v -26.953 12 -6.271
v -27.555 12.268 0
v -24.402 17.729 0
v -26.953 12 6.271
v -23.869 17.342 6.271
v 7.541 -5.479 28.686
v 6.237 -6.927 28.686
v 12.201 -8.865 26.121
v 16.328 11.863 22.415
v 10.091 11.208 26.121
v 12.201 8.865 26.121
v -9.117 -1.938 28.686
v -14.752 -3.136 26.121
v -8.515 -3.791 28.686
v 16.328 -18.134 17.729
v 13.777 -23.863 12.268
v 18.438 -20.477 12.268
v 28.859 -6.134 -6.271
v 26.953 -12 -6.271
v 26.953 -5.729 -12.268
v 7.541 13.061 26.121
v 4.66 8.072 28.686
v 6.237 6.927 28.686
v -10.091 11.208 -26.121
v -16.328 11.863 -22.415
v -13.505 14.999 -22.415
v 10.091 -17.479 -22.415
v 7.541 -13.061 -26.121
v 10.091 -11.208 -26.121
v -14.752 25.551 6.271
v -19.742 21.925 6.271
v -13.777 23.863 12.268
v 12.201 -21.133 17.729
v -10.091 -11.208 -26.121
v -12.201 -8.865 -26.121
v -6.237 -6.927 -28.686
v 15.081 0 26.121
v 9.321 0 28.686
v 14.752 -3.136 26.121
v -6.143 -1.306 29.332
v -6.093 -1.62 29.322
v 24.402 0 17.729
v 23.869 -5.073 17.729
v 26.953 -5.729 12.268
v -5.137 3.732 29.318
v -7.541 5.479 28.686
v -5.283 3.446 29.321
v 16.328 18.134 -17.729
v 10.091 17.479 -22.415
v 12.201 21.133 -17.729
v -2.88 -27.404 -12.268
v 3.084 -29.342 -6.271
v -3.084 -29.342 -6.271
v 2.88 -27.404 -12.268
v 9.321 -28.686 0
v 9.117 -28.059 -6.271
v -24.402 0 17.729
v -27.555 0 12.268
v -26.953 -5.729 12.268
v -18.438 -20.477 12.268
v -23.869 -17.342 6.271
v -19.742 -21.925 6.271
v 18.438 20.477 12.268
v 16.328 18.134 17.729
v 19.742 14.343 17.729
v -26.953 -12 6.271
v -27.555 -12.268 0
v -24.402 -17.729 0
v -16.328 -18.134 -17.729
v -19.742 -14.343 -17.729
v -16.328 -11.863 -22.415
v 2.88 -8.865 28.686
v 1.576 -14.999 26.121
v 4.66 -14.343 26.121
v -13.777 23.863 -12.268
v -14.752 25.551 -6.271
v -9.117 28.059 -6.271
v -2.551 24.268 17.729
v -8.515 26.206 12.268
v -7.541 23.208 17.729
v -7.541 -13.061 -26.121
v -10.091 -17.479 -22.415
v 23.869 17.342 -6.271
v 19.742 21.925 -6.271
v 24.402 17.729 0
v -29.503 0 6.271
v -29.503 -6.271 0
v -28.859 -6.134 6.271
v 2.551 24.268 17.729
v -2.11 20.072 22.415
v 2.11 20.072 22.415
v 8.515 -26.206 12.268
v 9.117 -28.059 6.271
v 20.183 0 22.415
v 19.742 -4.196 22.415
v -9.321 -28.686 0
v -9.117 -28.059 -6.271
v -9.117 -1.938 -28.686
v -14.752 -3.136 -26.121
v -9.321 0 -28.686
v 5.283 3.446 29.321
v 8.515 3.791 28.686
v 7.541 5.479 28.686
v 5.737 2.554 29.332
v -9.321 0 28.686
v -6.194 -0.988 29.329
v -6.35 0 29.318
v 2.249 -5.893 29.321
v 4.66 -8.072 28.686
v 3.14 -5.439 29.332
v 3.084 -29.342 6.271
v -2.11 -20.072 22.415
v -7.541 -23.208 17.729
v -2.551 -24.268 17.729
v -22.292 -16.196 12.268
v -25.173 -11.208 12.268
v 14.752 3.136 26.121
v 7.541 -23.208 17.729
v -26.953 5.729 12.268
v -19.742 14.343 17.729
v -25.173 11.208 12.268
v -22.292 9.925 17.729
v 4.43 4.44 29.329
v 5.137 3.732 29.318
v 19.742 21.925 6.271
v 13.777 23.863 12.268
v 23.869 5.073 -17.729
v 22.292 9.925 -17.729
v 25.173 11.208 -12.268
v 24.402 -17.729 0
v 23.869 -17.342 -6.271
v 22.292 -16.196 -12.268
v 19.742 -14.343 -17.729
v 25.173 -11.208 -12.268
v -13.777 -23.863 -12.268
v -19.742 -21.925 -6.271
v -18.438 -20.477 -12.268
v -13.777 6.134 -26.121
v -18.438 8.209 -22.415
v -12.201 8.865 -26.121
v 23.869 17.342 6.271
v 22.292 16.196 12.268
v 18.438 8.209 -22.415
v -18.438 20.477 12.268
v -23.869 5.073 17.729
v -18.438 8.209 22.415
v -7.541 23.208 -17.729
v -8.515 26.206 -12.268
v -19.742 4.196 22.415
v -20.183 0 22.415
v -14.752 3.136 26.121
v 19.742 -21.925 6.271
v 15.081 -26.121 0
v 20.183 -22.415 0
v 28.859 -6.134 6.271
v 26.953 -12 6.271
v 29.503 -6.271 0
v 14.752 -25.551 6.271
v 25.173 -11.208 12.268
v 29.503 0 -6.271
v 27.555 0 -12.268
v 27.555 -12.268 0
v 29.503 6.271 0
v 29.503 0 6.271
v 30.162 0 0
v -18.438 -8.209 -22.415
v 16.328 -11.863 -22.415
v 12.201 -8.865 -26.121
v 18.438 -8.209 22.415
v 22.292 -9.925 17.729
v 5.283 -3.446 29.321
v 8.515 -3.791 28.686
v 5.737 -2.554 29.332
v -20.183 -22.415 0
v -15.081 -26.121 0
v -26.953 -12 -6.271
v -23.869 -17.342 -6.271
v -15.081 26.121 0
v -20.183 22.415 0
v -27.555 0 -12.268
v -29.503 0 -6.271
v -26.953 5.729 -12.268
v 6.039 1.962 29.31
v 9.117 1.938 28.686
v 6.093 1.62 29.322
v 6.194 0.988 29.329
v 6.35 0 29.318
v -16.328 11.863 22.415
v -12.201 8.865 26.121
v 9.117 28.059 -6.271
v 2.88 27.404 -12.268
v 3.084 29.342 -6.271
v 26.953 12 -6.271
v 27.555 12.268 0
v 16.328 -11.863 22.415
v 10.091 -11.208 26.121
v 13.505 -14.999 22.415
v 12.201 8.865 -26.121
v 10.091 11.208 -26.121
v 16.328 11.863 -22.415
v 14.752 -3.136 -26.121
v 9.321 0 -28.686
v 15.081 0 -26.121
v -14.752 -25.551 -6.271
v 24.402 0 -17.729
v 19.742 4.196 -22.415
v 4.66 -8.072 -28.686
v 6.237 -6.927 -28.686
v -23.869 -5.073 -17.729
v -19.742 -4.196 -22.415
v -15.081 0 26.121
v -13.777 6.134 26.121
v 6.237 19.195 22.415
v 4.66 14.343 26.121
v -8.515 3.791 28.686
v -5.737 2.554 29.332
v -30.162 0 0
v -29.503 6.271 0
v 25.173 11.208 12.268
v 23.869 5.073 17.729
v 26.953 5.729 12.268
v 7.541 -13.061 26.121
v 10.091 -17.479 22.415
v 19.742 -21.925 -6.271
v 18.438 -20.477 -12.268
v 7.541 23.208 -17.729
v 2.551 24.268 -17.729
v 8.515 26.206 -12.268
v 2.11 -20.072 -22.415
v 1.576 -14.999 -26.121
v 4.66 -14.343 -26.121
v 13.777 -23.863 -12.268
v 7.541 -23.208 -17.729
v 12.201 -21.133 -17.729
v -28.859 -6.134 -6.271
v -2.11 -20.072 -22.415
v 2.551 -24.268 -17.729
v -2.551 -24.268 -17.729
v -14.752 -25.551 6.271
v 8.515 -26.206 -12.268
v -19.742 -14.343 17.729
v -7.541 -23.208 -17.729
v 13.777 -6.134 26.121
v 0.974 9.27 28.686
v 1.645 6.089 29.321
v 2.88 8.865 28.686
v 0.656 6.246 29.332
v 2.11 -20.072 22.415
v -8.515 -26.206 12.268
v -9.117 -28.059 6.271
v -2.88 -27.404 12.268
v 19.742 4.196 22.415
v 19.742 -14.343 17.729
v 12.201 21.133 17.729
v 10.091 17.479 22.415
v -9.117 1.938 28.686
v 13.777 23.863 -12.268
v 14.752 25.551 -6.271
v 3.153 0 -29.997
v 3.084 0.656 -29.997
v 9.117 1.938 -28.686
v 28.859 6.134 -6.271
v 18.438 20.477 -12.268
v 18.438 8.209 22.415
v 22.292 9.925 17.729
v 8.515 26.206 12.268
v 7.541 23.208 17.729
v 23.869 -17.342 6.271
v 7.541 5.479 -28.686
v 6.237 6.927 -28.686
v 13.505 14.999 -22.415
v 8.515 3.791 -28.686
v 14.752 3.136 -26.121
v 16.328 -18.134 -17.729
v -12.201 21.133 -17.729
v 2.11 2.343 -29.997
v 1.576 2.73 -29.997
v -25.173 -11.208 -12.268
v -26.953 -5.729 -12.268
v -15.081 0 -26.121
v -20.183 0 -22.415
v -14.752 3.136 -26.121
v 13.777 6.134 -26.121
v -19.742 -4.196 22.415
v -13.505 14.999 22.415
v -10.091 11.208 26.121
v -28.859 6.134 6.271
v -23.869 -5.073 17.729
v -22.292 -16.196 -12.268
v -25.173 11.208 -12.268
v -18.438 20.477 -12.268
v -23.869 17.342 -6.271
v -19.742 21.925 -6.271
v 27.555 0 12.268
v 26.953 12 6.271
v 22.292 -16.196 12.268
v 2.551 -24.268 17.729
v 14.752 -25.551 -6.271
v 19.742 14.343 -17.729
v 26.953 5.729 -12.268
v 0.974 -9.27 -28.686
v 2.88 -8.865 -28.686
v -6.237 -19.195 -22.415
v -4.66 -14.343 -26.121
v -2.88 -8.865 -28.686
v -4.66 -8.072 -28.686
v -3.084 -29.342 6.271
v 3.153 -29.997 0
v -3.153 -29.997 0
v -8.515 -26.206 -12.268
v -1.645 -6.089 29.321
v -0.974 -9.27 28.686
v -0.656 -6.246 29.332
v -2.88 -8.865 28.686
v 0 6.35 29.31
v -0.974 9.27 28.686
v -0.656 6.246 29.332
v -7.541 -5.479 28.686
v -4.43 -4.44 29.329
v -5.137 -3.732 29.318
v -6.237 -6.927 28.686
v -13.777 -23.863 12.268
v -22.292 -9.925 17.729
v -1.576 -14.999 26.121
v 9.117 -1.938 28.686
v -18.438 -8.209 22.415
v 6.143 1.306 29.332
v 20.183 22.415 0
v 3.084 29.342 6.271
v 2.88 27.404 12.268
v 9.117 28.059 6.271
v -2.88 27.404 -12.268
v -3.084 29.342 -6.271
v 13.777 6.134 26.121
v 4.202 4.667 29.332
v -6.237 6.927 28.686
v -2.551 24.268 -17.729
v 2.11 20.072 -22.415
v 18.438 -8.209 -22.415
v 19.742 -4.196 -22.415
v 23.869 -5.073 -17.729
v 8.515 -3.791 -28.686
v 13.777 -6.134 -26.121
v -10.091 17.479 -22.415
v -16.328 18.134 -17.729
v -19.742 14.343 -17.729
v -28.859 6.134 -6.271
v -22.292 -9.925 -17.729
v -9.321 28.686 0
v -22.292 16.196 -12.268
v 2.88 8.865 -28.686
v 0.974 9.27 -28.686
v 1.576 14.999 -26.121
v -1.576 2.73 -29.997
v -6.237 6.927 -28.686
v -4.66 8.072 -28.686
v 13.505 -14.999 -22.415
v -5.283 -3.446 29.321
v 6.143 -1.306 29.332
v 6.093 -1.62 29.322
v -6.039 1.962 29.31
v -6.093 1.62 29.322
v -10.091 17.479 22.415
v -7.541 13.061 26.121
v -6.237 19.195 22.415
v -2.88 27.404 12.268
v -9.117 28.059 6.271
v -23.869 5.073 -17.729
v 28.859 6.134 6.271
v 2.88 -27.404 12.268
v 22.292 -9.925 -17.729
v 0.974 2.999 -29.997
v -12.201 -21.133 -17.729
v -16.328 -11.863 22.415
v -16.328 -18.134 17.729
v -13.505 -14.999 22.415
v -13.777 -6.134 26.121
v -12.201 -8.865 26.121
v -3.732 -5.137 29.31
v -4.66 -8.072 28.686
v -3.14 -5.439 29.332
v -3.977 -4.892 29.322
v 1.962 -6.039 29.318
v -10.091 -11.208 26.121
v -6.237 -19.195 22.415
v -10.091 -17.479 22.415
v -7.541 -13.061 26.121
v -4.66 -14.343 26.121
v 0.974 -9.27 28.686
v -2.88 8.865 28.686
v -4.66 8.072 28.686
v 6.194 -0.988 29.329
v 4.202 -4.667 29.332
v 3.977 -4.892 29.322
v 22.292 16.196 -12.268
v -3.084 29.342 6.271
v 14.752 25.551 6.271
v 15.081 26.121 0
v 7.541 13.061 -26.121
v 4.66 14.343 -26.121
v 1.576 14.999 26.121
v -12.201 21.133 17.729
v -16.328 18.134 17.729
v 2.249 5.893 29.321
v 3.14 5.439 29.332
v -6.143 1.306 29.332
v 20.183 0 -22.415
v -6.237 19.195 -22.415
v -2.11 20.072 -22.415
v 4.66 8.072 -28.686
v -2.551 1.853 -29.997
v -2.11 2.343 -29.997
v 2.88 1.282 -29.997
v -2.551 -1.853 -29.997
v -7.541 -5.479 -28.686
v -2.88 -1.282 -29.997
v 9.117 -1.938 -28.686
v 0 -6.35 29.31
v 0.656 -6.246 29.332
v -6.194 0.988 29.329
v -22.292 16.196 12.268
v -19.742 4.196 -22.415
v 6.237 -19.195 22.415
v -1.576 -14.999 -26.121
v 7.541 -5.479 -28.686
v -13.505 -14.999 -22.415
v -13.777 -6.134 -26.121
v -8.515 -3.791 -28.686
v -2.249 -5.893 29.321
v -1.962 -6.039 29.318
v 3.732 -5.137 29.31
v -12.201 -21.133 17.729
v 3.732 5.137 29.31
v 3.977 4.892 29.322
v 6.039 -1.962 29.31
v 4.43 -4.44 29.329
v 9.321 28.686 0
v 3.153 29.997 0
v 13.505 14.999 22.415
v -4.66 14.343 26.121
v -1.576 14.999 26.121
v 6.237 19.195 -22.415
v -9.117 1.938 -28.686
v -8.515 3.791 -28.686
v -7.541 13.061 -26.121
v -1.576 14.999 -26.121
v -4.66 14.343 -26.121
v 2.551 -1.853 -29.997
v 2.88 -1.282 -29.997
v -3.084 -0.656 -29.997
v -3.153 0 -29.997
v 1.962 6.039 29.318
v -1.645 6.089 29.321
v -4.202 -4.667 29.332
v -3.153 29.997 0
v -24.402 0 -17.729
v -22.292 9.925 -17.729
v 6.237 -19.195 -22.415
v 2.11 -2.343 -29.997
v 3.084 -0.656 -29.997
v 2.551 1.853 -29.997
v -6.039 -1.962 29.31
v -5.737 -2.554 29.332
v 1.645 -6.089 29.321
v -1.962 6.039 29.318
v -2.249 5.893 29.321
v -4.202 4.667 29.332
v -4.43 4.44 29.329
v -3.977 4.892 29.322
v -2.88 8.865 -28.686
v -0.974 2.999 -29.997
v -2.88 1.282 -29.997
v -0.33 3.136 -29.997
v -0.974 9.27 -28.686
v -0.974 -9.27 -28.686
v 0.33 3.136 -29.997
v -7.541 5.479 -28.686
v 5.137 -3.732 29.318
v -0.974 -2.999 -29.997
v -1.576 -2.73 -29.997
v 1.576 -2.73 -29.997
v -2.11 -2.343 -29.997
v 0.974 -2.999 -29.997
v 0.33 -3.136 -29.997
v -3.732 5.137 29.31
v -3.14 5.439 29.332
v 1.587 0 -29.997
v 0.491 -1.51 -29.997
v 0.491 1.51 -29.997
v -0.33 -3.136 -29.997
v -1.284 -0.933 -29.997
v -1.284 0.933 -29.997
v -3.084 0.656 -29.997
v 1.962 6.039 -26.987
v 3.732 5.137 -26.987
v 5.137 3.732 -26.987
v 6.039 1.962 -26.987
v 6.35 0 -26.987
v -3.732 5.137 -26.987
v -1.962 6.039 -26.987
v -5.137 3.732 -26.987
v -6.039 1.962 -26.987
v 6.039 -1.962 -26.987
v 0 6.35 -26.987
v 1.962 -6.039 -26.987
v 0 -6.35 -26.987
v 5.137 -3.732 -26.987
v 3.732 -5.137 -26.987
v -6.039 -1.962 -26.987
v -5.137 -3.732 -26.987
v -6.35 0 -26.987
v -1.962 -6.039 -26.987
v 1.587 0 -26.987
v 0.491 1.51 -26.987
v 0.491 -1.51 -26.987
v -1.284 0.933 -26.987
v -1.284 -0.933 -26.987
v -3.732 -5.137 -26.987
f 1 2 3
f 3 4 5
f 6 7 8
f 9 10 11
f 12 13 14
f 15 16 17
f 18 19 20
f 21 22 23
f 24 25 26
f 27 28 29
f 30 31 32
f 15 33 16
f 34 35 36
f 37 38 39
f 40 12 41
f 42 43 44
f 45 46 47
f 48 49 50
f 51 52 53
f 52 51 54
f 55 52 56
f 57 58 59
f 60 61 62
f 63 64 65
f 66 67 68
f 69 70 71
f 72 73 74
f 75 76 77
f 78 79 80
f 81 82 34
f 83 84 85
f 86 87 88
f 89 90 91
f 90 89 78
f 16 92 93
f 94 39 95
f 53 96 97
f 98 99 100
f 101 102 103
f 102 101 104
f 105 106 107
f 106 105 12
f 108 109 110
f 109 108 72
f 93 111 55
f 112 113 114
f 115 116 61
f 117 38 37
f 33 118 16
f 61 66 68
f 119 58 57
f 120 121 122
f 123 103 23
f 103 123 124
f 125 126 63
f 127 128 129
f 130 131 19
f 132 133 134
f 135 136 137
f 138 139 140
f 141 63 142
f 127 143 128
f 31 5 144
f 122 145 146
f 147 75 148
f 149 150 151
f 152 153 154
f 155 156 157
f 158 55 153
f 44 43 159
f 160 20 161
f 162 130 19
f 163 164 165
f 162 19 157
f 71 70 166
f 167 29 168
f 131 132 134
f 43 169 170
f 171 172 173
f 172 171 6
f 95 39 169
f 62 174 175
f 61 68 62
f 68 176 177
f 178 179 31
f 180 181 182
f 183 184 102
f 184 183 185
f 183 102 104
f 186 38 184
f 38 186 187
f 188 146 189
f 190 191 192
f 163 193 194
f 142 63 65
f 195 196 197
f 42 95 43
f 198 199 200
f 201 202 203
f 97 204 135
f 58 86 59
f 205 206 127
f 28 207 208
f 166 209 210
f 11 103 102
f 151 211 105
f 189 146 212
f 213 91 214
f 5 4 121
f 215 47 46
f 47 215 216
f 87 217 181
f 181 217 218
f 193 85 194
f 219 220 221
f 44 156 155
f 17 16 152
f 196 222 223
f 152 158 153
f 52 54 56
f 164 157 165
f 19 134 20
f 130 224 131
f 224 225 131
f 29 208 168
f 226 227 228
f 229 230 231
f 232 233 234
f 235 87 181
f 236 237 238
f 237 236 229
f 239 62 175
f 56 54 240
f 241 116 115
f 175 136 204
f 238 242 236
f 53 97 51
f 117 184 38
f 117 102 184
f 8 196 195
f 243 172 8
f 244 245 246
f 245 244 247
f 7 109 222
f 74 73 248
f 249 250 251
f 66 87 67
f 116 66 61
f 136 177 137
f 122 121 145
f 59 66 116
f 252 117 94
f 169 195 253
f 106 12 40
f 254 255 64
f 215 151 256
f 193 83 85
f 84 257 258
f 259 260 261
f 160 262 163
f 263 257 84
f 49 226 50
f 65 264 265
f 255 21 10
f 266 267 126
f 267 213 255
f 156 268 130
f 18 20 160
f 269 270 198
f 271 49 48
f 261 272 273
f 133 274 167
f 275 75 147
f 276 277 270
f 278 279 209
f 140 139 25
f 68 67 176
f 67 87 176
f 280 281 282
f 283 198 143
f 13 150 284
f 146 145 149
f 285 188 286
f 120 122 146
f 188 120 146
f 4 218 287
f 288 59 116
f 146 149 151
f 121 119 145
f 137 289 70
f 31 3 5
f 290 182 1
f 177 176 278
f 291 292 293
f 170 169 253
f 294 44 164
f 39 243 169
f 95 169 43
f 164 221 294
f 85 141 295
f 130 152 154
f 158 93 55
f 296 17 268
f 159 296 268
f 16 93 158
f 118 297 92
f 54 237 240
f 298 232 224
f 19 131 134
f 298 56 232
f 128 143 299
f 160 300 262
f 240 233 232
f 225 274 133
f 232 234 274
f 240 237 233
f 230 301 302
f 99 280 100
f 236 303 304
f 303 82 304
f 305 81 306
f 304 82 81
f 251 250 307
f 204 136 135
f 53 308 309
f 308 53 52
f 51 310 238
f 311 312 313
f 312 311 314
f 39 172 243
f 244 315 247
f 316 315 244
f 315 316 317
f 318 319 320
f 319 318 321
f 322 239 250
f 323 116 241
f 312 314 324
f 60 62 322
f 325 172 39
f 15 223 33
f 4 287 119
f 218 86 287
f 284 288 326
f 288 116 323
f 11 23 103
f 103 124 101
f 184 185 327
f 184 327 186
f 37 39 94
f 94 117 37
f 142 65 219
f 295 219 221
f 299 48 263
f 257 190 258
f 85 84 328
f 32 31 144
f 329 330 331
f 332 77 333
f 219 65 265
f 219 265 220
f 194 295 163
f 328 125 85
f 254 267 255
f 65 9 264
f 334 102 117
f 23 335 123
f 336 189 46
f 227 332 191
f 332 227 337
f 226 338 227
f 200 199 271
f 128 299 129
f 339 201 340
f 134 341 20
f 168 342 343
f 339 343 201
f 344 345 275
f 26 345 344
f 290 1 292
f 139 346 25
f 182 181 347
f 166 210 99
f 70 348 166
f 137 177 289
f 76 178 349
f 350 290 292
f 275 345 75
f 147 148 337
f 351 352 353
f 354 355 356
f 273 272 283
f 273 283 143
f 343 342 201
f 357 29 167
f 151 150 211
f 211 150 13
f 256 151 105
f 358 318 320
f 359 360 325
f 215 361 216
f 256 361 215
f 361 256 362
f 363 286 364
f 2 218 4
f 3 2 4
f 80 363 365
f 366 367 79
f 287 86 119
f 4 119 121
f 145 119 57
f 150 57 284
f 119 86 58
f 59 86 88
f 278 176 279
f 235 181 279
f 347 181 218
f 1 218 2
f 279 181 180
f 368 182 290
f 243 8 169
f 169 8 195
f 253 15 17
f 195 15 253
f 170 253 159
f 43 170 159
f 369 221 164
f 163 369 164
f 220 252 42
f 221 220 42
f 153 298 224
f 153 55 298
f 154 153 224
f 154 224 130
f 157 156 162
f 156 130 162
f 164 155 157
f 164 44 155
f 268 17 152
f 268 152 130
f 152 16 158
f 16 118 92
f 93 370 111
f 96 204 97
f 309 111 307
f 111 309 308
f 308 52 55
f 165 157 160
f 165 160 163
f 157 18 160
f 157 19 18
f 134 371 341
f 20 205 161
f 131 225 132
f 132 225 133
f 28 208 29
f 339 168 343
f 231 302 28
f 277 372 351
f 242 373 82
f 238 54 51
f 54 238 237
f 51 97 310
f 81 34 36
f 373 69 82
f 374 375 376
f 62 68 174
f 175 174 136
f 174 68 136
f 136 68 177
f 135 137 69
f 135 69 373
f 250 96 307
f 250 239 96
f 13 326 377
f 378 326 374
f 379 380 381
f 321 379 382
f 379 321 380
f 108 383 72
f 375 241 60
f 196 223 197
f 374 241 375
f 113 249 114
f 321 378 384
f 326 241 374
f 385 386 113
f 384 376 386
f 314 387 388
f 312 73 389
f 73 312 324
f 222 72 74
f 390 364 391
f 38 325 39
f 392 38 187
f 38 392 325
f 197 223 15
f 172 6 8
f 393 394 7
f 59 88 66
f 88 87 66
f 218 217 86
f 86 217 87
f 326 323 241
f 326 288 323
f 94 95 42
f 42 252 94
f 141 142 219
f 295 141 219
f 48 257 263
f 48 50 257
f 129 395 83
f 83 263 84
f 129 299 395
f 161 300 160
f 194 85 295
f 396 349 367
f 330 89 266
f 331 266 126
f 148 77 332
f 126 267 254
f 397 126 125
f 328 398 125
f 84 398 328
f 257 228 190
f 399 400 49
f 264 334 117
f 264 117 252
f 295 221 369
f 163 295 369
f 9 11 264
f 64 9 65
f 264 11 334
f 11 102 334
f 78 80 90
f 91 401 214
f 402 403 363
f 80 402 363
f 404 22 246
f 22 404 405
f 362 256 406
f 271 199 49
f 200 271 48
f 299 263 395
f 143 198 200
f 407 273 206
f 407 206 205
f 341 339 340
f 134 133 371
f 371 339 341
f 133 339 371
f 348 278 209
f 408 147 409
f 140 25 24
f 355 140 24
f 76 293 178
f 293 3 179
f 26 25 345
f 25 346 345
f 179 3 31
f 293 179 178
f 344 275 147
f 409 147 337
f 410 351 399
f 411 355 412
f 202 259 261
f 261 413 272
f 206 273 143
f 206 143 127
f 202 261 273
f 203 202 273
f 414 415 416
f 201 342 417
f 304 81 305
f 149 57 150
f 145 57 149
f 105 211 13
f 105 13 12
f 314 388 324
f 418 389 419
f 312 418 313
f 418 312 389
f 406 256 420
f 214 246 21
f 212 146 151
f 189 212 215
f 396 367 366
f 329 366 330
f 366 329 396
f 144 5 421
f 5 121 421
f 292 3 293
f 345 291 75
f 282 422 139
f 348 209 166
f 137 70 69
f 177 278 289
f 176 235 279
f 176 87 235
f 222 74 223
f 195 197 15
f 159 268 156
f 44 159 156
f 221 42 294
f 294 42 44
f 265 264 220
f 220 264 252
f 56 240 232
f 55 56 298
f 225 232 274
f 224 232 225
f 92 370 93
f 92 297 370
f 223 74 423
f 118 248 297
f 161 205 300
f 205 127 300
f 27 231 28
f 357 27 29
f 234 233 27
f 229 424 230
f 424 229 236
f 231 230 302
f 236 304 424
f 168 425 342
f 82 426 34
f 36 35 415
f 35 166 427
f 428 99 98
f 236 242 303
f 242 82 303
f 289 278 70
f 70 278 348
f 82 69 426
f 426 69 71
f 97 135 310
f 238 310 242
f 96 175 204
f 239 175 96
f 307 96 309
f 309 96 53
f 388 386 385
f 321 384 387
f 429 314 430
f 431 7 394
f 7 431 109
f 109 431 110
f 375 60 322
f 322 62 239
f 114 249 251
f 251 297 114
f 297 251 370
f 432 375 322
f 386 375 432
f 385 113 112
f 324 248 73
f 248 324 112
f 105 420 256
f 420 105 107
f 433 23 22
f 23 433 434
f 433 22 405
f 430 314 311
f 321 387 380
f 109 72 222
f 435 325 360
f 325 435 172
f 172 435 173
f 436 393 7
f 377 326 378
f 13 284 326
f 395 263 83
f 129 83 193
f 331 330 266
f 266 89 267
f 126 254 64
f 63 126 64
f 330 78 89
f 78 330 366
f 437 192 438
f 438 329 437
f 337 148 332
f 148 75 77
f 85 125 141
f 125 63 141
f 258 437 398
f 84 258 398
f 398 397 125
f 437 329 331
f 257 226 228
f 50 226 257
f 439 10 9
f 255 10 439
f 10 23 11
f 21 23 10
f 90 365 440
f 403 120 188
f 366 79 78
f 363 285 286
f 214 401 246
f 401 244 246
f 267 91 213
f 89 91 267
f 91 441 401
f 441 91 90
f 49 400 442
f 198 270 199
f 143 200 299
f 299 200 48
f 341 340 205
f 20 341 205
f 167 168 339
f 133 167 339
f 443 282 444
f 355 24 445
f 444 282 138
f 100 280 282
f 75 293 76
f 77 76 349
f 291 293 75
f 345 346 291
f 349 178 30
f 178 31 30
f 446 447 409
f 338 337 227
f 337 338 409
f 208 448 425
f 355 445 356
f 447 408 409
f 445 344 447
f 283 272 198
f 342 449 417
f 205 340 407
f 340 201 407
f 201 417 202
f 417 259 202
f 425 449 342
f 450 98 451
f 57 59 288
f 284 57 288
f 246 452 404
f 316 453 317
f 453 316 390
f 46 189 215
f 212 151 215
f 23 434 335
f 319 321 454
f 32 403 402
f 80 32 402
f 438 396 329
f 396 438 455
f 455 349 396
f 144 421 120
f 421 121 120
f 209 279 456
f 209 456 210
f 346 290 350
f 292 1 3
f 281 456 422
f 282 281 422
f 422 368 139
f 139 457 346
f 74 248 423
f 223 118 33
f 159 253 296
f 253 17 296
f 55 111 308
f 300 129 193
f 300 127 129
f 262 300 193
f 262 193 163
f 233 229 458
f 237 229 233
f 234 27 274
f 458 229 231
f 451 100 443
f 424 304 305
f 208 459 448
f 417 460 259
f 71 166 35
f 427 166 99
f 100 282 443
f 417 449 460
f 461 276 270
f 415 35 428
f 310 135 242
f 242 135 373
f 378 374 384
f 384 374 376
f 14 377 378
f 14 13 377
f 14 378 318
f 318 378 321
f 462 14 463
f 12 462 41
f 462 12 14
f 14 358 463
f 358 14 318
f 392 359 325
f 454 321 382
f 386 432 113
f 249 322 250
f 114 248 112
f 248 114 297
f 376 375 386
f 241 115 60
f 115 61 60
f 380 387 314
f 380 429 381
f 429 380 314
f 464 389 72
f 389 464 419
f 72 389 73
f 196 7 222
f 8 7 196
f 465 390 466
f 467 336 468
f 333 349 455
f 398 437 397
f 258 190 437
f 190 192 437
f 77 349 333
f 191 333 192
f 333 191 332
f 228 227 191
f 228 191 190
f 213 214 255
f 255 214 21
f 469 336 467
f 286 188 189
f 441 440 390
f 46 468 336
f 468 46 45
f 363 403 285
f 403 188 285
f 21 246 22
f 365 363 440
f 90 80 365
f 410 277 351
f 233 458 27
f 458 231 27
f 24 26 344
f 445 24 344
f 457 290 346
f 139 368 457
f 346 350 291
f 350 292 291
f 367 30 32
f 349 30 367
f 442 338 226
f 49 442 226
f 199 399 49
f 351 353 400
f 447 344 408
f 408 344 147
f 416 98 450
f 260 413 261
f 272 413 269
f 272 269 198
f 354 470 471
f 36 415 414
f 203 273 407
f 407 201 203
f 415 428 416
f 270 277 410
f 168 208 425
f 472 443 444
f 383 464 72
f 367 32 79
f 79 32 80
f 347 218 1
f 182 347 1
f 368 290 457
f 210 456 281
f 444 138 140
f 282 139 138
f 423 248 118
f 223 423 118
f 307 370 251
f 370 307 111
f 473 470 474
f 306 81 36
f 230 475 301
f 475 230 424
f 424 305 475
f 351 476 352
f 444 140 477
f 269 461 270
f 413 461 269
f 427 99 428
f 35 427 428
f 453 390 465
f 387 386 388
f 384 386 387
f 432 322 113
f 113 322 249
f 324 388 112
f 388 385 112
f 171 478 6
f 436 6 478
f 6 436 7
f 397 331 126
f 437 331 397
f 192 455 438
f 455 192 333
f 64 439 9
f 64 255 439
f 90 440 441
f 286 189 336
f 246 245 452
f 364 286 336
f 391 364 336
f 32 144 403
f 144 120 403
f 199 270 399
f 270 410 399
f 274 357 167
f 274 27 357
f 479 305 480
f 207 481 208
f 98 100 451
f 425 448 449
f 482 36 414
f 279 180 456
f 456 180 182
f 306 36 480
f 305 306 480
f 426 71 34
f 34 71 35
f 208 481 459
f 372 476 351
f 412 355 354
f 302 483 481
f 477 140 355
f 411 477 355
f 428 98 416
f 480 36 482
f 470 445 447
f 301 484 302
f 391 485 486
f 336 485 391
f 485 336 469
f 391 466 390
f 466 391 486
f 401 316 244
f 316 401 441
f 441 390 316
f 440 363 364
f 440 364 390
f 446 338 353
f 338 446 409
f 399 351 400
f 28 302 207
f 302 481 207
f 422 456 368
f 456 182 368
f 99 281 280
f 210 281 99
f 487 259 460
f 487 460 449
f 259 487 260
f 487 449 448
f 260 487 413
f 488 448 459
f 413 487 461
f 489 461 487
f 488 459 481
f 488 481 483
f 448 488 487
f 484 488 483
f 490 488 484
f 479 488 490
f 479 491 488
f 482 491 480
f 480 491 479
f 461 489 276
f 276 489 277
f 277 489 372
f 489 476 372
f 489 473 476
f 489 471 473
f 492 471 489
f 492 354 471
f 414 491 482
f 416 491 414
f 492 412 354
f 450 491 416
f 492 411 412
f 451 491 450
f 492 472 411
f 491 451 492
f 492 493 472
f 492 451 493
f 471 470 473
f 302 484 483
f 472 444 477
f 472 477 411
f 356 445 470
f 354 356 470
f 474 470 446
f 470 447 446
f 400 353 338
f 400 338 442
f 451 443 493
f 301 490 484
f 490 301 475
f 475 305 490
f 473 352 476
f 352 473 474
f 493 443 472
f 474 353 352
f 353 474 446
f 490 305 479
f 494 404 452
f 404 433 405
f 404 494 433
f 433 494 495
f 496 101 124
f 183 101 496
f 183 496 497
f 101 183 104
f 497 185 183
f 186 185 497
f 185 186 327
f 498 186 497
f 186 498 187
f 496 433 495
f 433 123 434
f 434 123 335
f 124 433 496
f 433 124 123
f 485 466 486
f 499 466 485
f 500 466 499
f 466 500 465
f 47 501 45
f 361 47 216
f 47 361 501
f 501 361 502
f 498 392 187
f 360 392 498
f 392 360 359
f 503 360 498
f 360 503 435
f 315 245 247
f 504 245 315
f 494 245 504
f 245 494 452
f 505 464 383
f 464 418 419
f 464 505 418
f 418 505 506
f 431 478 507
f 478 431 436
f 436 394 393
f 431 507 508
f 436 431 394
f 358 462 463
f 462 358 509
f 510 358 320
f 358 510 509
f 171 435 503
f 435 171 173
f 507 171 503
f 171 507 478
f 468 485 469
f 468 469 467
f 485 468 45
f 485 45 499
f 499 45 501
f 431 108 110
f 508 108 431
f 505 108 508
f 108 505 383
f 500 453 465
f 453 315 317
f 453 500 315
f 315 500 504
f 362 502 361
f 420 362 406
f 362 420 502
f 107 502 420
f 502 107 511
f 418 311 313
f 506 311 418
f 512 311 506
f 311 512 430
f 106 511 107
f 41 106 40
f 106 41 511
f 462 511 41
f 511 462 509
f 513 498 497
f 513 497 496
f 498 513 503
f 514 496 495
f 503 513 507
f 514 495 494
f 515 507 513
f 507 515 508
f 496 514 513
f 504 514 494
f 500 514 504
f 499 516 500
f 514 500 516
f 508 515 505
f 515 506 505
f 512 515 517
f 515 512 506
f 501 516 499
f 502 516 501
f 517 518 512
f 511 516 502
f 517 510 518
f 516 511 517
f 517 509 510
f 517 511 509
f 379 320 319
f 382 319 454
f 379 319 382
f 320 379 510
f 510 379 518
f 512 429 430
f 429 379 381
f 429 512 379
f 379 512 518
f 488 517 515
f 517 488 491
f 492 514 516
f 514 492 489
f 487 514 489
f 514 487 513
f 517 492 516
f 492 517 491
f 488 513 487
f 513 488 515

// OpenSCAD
module tama(){
    radius = 60.325/2;
    difference(){
        sphere(radius);
        translate([0,0,-26.9875]) cylinder(h = 60.325, r = 12.7/2);
        translate([0,0,-35]) cylinder(h = 70, r = 3.175/2);
        
    }
}


tama();
